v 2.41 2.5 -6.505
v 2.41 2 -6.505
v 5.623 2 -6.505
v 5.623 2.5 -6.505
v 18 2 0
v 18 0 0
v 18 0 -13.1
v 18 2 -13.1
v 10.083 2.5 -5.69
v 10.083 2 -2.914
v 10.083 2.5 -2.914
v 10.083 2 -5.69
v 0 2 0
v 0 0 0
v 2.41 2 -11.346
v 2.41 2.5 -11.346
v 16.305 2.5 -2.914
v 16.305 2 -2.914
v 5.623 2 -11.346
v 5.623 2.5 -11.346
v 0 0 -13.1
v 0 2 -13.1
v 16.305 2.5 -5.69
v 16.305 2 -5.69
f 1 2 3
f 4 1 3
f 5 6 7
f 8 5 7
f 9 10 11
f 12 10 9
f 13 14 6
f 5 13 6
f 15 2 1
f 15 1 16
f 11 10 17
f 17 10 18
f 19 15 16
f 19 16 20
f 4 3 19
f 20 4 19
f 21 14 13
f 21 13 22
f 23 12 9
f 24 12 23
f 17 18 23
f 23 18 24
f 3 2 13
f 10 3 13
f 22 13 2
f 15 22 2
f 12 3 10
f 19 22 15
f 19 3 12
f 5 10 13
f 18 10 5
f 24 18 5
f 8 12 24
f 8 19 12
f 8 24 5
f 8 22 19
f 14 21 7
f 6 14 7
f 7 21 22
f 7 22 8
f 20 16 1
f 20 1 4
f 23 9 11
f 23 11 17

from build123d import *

# Parameters (mm, degrees)
SKETCH1_W           = 18
SKETCH1_H           = 13.1
BOSS_EXTRUDE1_DEPTH = 2
SKETCH2_W           = 3.212723326
SKETCH2_H           = 4.841010911
SKETCH2_W_2         = 6.22211932
SKETCH2_H_2         = 2.776214037
BOSS_EXTRUDE2_DEPTH = 0.5


with BuildPart() as part:
    # Sketch1 → Boss-Extrude1 (new body)
    with BuildSketch(Plane(origin=(0, 0, 0), x_dir=(1, 0, 0), z_dir=(0, 1, 0))):
        with Locations((9, 6.55)):
            Rectangle(SKETCH1_W, SKETCH1_H)
    extrude(amount=BOSS_EXTRUDE1_DEPTH)

    # Sketch2 → Boss-Extrude2 (add)
    with BuildSketch(Plane(origin=(0, 2, 0), x_dir=(1, 0, 0), z_dir=(0, 1, 0))):
        with Locations((4.016157197, 8.925346003)):
            Rectangle(SKETCH2_W, SKETCH2_H)
        with Locations((13.193985763, 4.302170731)):
            Rectangle(SKETCH2_W_2, SKETCH2_H_2)
    extrude(amount=BOSS_EXTRUDE2_DEPTH)


solid = part.part
